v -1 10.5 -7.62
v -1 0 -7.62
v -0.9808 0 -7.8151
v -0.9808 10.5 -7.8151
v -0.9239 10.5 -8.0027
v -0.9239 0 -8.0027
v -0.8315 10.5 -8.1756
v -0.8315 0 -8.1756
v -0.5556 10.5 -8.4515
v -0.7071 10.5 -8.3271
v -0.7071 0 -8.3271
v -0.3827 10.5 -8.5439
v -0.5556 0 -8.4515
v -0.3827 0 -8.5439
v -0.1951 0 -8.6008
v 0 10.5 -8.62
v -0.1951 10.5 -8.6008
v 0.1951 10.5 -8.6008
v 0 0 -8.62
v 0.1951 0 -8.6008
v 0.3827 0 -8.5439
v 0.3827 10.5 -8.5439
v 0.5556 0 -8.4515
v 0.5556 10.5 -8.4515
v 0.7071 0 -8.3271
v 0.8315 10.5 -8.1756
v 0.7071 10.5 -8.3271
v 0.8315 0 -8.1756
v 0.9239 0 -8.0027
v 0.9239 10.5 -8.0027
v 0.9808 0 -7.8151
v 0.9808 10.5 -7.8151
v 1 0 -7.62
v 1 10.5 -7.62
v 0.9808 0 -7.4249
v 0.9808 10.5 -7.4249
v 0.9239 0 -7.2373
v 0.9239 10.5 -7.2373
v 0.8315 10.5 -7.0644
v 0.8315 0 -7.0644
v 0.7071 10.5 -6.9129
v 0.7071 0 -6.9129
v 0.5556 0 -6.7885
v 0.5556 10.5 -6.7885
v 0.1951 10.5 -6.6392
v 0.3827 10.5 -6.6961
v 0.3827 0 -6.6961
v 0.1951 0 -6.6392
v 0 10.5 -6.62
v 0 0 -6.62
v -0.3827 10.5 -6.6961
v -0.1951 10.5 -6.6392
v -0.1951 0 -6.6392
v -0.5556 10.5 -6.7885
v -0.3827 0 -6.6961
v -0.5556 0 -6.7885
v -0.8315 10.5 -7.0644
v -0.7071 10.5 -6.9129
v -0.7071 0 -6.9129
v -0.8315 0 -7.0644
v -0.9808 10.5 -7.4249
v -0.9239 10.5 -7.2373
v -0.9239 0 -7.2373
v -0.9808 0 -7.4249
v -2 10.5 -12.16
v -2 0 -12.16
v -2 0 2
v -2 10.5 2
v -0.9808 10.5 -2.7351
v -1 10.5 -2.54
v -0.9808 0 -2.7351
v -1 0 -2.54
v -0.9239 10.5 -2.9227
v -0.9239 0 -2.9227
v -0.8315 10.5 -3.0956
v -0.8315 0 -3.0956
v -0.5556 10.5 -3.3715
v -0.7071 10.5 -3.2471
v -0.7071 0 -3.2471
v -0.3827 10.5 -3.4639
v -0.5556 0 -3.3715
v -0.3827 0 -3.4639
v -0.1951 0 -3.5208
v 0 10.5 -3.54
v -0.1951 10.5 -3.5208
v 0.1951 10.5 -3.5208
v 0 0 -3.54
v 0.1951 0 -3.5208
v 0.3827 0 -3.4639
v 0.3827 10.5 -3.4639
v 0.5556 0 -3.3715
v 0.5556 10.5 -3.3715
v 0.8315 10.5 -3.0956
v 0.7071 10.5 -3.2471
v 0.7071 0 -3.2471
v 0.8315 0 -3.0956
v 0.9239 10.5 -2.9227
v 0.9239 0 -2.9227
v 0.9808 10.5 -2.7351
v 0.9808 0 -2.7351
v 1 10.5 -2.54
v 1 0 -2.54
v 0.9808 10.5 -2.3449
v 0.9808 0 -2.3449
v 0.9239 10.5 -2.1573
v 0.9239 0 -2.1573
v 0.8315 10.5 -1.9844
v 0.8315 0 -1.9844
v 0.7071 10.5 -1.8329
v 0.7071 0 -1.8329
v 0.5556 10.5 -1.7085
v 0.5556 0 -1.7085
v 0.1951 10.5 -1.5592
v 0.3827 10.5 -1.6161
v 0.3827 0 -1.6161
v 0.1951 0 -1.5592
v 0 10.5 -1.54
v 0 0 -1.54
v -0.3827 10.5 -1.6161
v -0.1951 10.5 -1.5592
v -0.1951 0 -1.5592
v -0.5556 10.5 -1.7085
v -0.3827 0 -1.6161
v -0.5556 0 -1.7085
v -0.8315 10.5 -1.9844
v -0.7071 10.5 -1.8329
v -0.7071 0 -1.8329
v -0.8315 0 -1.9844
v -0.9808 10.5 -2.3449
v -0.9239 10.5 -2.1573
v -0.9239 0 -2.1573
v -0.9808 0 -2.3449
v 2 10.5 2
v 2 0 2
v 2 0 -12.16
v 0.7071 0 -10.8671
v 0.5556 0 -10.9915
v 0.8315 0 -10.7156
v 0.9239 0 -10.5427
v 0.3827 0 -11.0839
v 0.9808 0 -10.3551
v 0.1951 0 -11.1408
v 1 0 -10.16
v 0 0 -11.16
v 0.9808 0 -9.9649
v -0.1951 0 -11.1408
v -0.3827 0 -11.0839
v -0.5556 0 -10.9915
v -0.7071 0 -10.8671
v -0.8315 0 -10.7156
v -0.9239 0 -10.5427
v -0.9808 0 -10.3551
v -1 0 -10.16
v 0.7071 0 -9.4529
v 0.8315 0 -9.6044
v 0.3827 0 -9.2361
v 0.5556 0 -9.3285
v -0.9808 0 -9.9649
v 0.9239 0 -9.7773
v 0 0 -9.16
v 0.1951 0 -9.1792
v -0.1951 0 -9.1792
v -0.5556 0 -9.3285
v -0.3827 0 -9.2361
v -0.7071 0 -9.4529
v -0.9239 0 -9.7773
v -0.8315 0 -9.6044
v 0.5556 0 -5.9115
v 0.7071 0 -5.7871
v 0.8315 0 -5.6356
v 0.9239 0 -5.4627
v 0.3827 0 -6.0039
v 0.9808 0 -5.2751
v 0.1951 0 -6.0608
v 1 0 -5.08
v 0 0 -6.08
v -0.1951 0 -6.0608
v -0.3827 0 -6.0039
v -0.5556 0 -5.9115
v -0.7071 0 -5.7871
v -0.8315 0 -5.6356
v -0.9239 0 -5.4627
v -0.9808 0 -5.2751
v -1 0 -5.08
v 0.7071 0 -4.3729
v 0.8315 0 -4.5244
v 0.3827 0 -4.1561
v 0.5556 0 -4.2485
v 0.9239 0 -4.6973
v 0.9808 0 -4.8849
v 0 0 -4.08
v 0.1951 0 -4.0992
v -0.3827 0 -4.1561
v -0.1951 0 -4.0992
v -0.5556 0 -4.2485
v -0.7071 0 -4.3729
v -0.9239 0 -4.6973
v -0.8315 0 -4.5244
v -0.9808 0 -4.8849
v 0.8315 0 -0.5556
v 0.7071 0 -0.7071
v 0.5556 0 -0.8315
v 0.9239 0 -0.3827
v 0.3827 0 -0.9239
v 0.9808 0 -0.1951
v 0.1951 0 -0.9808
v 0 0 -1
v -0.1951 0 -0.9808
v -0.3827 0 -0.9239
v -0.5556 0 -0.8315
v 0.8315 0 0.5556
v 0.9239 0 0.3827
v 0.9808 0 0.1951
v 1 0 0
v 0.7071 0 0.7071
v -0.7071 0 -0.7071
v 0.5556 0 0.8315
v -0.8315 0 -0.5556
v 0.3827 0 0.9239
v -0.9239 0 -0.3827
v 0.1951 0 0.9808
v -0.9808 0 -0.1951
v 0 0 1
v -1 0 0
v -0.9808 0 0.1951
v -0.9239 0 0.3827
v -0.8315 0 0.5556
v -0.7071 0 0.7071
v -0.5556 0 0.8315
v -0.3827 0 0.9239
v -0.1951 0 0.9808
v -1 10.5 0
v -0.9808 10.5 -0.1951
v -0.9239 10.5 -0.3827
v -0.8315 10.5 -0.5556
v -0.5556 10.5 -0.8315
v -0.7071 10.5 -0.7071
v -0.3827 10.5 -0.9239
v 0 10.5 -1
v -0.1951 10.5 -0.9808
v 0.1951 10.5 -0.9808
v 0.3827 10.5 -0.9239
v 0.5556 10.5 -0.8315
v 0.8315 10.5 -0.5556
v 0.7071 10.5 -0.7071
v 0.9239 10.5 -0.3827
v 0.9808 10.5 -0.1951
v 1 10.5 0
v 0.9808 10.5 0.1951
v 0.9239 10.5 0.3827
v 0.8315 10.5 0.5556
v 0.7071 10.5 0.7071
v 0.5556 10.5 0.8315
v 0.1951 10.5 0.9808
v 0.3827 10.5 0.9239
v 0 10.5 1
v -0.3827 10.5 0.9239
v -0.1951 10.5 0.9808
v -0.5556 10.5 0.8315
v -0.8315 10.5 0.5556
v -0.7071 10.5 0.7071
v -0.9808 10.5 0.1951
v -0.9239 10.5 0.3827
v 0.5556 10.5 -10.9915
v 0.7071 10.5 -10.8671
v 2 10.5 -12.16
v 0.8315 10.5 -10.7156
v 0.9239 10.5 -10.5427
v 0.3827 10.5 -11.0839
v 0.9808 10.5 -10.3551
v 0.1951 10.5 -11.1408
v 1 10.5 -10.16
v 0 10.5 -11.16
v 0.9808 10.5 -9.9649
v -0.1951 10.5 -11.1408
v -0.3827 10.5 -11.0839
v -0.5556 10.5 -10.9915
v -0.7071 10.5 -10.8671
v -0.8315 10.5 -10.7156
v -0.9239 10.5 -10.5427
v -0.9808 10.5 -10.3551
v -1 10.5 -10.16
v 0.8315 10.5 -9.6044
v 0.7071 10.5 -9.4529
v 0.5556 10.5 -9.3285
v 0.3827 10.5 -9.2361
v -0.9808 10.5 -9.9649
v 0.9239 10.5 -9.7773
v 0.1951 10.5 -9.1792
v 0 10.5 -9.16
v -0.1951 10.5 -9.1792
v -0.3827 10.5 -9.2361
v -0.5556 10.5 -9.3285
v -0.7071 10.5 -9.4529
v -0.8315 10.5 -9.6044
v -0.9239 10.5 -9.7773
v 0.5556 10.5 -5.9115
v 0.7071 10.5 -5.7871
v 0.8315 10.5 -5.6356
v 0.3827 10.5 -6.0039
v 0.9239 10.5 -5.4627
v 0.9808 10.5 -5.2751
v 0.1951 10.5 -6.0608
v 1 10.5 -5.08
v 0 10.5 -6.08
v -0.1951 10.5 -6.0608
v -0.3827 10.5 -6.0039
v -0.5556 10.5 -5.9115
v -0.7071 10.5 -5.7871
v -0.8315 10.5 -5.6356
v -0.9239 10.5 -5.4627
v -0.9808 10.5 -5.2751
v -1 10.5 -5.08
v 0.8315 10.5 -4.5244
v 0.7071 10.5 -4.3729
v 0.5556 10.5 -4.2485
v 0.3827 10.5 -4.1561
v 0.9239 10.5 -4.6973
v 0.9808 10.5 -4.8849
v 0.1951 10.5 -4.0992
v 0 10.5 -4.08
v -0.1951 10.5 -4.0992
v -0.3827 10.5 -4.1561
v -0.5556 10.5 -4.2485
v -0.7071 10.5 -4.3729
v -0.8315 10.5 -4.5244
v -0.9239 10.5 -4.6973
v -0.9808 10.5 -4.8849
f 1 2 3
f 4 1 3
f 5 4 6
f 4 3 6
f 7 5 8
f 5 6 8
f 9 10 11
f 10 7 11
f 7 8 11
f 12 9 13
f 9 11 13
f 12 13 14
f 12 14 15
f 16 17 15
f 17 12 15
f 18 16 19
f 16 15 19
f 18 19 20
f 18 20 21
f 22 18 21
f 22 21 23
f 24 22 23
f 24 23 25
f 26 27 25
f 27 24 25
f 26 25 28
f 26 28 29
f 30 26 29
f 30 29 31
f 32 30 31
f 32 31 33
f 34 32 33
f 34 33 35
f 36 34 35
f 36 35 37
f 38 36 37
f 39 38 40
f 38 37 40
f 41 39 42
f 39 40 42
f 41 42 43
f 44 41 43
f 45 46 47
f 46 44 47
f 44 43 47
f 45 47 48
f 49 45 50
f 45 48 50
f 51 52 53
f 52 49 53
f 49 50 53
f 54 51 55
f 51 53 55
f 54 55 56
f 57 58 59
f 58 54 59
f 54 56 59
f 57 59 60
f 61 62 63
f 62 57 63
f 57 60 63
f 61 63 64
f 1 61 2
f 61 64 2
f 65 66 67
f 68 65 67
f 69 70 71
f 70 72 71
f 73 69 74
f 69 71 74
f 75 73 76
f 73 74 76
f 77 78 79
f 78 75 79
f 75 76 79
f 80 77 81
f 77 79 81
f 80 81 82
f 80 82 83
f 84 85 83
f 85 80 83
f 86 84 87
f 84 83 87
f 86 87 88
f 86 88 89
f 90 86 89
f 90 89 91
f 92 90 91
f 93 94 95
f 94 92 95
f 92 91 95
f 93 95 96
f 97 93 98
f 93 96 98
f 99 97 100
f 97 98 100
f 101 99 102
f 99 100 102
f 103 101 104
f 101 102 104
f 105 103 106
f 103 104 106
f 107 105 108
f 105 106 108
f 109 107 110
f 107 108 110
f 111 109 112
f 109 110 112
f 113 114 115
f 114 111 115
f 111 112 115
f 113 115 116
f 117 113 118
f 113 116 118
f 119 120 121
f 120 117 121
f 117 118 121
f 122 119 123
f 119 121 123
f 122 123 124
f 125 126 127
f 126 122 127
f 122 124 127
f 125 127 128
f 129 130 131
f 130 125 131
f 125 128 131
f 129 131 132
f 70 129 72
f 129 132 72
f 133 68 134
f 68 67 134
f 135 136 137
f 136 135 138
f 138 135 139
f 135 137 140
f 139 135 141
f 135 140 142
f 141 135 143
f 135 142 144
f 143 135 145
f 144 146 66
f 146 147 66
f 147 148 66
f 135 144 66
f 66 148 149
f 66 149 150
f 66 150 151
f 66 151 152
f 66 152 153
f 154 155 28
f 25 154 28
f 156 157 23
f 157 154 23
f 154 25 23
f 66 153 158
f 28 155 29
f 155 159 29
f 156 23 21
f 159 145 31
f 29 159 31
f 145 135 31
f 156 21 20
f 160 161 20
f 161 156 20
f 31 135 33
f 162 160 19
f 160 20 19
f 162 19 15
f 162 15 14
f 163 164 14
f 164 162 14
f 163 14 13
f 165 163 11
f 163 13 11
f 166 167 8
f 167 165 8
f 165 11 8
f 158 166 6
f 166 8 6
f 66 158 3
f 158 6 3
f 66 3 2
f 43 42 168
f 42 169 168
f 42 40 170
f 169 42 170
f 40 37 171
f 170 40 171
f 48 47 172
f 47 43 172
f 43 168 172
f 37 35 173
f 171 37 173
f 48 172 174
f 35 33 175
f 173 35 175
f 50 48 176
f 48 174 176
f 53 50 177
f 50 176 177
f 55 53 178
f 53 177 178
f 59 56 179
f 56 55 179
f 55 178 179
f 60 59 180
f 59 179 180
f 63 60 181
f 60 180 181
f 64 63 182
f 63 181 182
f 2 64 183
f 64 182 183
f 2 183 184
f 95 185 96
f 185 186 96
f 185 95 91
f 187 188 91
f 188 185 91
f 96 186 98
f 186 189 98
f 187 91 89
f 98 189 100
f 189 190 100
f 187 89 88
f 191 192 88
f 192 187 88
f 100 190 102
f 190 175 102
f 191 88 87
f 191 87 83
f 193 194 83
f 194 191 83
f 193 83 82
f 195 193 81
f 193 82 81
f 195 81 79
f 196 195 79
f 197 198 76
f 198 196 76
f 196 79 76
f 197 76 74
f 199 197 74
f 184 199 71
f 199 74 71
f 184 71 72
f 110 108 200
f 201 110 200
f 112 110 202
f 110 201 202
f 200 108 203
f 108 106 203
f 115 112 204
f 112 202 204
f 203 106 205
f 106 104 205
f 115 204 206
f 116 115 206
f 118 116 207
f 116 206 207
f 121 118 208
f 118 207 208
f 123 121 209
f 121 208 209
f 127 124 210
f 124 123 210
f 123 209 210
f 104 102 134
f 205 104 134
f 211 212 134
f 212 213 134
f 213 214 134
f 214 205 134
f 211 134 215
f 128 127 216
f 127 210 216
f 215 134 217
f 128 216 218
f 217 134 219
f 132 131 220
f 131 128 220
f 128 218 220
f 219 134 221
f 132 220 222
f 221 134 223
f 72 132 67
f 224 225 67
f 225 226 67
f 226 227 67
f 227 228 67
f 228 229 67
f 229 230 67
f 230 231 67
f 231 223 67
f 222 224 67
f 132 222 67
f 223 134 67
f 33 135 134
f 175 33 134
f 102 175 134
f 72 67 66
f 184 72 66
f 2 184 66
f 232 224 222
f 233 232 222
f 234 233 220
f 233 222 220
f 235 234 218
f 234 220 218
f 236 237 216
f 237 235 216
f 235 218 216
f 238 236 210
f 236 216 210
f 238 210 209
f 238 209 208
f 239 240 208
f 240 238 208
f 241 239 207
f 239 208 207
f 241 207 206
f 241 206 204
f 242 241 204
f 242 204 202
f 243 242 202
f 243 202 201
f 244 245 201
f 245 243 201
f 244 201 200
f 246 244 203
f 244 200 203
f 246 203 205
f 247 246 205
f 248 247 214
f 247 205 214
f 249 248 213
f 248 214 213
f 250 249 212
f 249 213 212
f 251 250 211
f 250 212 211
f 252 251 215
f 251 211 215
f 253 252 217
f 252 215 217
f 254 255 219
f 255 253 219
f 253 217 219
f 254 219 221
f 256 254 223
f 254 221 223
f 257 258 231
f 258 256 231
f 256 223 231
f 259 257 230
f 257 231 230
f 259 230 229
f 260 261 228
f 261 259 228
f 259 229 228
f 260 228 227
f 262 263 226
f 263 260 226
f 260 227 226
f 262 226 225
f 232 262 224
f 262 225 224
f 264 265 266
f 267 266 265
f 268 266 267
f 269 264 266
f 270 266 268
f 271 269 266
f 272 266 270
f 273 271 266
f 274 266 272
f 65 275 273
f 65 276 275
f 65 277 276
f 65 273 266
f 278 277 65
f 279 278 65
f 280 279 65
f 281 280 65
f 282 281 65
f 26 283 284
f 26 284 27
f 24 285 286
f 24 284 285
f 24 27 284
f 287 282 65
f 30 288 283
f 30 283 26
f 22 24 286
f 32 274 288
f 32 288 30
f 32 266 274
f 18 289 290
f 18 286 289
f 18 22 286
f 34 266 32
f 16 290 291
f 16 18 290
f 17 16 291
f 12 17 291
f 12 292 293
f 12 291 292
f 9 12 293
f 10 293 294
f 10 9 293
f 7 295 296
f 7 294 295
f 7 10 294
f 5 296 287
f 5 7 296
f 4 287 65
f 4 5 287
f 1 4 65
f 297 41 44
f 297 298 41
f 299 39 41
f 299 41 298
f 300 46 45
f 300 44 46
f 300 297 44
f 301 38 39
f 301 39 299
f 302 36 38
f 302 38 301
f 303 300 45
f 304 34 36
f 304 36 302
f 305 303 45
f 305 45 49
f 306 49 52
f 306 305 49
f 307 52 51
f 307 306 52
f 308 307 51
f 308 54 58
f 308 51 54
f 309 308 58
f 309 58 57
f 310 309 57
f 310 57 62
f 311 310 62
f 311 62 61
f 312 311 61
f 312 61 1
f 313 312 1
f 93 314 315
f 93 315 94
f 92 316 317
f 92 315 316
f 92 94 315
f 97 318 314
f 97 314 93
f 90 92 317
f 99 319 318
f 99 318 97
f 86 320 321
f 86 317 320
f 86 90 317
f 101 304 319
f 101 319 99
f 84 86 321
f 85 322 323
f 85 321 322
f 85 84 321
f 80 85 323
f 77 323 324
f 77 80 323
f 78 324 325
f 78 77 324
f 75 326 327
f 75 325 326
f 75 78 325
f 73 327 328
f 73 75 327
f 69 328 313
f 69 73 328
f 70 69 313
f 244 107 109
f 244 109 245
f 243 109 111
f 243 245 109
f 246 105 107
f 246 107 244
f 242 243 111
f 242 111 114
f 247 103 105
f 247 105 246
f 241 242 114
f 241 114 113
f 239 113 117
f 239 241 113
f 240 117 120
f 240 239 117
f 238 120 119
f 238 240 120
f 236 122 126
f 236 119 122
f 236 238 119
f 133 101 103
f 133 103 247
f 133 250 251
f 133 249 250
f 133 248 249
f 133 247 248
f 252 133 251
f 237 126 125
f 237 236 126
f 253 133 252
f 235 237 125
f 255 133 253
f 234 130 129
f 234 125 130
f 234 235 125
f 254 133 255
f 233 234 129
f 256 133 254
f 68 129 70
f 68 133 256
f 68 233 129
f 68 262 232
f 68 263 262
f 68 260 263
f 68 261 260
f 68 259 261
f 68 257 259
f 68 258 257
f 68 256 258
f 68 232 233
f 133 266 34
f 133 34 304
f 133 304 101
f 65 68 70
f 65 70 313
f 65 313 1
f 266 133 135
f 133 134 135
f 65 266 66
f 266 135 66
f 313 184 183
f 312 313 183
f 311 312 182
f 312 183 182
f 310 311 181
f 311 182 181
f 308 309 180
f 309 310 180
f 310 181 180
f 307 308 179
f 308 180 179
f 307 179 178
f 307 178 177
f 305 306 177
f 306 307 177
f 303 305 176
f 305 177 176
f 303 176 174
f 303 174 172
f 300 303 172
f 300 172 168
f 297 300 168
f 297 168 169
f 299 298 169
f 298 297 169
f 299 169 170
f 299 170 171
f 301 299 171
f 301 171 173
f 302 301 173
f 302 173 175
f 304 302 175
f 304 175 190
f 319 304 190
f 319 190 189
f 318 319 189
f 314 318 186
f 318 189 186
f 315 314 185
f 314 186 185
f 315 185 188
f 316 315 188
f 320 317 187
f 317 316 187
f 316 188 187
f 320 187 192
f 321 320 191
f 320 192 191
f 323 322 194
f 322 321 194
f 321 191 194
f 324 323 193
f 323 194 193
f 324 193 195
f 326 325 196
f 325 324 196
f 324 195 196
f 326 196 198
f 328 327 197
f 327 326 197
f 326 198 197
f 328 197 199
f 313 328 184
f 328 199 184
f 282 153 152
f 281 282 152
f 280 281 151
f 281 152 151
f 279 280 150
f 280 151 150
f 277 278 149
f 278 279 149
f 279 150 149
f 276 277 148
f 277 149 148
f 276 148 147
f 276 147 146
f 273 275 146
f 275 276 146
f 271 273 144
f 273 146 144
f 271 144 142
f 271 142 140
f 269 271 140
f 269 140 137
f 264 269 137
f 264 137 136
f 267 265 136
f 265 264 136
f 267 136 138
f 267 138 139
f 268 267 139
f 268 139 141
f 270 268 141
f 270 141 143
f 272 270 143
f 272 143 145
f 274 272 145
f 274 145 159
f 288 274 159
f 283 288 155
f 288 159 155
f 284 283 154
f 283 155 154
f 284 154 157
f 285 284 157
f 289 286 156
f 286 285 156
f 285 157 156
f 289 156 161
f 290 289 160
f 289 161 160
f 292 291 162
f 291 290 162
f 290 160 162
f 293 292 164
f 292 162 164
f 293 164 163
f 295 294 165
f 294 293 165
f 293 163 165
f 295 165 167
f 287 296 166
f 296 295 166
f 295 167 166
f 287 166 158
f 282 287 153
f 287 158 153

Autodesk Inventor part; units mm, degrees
ref_plane "YZ Plane" through (0, 0, 0) normal (1, 0, 0) x (0, 1, 0)
ref_plane "XZ Plane" through (0, 0, 0) normal (0, 1, 0) x (-1, 0, 0)
ref_plane "XY Plane" through (0, 0, 0) normal (0, 0, 1) x (1, 0, 0)
sketch "Sketch1" plane through (0, 0, 0) normal (0, 1, 0) x (-1, 0, 0)
  circle A0 centre (0, 0) radius 1
  line L0 (2, 2) -> (-2, 2)
  line L1 (-2, 2) -> (-2, -12.16)
  line L2 (-2, -12.16) -> (2, -12.16)
  line L3 (2, -12.16) -> (2, 2)
  circle A1 centre (0, -2.54) radius 1
  circle A2 centre (0, -5.08) radius 1
  circle A3 centre (0, -7.62) radius 1
  circle A4 centre (0, -10.16) radius 1
  dimension "d0" = 2
  dimension "d3" = 2.54
  dimension "d8" = 1
  dimension "d9" = 1
  dimension "d10" = 1
  dimension "d11" = 1
extrude "Extrusion1" add sketch "Sketch1" along normal blind 10.5
equation "\"d9\" = d8"
equation "\"d10\" = d8"
equation "\"d11\" = d8"
properties part number "Encoder Header Spacer 2"
